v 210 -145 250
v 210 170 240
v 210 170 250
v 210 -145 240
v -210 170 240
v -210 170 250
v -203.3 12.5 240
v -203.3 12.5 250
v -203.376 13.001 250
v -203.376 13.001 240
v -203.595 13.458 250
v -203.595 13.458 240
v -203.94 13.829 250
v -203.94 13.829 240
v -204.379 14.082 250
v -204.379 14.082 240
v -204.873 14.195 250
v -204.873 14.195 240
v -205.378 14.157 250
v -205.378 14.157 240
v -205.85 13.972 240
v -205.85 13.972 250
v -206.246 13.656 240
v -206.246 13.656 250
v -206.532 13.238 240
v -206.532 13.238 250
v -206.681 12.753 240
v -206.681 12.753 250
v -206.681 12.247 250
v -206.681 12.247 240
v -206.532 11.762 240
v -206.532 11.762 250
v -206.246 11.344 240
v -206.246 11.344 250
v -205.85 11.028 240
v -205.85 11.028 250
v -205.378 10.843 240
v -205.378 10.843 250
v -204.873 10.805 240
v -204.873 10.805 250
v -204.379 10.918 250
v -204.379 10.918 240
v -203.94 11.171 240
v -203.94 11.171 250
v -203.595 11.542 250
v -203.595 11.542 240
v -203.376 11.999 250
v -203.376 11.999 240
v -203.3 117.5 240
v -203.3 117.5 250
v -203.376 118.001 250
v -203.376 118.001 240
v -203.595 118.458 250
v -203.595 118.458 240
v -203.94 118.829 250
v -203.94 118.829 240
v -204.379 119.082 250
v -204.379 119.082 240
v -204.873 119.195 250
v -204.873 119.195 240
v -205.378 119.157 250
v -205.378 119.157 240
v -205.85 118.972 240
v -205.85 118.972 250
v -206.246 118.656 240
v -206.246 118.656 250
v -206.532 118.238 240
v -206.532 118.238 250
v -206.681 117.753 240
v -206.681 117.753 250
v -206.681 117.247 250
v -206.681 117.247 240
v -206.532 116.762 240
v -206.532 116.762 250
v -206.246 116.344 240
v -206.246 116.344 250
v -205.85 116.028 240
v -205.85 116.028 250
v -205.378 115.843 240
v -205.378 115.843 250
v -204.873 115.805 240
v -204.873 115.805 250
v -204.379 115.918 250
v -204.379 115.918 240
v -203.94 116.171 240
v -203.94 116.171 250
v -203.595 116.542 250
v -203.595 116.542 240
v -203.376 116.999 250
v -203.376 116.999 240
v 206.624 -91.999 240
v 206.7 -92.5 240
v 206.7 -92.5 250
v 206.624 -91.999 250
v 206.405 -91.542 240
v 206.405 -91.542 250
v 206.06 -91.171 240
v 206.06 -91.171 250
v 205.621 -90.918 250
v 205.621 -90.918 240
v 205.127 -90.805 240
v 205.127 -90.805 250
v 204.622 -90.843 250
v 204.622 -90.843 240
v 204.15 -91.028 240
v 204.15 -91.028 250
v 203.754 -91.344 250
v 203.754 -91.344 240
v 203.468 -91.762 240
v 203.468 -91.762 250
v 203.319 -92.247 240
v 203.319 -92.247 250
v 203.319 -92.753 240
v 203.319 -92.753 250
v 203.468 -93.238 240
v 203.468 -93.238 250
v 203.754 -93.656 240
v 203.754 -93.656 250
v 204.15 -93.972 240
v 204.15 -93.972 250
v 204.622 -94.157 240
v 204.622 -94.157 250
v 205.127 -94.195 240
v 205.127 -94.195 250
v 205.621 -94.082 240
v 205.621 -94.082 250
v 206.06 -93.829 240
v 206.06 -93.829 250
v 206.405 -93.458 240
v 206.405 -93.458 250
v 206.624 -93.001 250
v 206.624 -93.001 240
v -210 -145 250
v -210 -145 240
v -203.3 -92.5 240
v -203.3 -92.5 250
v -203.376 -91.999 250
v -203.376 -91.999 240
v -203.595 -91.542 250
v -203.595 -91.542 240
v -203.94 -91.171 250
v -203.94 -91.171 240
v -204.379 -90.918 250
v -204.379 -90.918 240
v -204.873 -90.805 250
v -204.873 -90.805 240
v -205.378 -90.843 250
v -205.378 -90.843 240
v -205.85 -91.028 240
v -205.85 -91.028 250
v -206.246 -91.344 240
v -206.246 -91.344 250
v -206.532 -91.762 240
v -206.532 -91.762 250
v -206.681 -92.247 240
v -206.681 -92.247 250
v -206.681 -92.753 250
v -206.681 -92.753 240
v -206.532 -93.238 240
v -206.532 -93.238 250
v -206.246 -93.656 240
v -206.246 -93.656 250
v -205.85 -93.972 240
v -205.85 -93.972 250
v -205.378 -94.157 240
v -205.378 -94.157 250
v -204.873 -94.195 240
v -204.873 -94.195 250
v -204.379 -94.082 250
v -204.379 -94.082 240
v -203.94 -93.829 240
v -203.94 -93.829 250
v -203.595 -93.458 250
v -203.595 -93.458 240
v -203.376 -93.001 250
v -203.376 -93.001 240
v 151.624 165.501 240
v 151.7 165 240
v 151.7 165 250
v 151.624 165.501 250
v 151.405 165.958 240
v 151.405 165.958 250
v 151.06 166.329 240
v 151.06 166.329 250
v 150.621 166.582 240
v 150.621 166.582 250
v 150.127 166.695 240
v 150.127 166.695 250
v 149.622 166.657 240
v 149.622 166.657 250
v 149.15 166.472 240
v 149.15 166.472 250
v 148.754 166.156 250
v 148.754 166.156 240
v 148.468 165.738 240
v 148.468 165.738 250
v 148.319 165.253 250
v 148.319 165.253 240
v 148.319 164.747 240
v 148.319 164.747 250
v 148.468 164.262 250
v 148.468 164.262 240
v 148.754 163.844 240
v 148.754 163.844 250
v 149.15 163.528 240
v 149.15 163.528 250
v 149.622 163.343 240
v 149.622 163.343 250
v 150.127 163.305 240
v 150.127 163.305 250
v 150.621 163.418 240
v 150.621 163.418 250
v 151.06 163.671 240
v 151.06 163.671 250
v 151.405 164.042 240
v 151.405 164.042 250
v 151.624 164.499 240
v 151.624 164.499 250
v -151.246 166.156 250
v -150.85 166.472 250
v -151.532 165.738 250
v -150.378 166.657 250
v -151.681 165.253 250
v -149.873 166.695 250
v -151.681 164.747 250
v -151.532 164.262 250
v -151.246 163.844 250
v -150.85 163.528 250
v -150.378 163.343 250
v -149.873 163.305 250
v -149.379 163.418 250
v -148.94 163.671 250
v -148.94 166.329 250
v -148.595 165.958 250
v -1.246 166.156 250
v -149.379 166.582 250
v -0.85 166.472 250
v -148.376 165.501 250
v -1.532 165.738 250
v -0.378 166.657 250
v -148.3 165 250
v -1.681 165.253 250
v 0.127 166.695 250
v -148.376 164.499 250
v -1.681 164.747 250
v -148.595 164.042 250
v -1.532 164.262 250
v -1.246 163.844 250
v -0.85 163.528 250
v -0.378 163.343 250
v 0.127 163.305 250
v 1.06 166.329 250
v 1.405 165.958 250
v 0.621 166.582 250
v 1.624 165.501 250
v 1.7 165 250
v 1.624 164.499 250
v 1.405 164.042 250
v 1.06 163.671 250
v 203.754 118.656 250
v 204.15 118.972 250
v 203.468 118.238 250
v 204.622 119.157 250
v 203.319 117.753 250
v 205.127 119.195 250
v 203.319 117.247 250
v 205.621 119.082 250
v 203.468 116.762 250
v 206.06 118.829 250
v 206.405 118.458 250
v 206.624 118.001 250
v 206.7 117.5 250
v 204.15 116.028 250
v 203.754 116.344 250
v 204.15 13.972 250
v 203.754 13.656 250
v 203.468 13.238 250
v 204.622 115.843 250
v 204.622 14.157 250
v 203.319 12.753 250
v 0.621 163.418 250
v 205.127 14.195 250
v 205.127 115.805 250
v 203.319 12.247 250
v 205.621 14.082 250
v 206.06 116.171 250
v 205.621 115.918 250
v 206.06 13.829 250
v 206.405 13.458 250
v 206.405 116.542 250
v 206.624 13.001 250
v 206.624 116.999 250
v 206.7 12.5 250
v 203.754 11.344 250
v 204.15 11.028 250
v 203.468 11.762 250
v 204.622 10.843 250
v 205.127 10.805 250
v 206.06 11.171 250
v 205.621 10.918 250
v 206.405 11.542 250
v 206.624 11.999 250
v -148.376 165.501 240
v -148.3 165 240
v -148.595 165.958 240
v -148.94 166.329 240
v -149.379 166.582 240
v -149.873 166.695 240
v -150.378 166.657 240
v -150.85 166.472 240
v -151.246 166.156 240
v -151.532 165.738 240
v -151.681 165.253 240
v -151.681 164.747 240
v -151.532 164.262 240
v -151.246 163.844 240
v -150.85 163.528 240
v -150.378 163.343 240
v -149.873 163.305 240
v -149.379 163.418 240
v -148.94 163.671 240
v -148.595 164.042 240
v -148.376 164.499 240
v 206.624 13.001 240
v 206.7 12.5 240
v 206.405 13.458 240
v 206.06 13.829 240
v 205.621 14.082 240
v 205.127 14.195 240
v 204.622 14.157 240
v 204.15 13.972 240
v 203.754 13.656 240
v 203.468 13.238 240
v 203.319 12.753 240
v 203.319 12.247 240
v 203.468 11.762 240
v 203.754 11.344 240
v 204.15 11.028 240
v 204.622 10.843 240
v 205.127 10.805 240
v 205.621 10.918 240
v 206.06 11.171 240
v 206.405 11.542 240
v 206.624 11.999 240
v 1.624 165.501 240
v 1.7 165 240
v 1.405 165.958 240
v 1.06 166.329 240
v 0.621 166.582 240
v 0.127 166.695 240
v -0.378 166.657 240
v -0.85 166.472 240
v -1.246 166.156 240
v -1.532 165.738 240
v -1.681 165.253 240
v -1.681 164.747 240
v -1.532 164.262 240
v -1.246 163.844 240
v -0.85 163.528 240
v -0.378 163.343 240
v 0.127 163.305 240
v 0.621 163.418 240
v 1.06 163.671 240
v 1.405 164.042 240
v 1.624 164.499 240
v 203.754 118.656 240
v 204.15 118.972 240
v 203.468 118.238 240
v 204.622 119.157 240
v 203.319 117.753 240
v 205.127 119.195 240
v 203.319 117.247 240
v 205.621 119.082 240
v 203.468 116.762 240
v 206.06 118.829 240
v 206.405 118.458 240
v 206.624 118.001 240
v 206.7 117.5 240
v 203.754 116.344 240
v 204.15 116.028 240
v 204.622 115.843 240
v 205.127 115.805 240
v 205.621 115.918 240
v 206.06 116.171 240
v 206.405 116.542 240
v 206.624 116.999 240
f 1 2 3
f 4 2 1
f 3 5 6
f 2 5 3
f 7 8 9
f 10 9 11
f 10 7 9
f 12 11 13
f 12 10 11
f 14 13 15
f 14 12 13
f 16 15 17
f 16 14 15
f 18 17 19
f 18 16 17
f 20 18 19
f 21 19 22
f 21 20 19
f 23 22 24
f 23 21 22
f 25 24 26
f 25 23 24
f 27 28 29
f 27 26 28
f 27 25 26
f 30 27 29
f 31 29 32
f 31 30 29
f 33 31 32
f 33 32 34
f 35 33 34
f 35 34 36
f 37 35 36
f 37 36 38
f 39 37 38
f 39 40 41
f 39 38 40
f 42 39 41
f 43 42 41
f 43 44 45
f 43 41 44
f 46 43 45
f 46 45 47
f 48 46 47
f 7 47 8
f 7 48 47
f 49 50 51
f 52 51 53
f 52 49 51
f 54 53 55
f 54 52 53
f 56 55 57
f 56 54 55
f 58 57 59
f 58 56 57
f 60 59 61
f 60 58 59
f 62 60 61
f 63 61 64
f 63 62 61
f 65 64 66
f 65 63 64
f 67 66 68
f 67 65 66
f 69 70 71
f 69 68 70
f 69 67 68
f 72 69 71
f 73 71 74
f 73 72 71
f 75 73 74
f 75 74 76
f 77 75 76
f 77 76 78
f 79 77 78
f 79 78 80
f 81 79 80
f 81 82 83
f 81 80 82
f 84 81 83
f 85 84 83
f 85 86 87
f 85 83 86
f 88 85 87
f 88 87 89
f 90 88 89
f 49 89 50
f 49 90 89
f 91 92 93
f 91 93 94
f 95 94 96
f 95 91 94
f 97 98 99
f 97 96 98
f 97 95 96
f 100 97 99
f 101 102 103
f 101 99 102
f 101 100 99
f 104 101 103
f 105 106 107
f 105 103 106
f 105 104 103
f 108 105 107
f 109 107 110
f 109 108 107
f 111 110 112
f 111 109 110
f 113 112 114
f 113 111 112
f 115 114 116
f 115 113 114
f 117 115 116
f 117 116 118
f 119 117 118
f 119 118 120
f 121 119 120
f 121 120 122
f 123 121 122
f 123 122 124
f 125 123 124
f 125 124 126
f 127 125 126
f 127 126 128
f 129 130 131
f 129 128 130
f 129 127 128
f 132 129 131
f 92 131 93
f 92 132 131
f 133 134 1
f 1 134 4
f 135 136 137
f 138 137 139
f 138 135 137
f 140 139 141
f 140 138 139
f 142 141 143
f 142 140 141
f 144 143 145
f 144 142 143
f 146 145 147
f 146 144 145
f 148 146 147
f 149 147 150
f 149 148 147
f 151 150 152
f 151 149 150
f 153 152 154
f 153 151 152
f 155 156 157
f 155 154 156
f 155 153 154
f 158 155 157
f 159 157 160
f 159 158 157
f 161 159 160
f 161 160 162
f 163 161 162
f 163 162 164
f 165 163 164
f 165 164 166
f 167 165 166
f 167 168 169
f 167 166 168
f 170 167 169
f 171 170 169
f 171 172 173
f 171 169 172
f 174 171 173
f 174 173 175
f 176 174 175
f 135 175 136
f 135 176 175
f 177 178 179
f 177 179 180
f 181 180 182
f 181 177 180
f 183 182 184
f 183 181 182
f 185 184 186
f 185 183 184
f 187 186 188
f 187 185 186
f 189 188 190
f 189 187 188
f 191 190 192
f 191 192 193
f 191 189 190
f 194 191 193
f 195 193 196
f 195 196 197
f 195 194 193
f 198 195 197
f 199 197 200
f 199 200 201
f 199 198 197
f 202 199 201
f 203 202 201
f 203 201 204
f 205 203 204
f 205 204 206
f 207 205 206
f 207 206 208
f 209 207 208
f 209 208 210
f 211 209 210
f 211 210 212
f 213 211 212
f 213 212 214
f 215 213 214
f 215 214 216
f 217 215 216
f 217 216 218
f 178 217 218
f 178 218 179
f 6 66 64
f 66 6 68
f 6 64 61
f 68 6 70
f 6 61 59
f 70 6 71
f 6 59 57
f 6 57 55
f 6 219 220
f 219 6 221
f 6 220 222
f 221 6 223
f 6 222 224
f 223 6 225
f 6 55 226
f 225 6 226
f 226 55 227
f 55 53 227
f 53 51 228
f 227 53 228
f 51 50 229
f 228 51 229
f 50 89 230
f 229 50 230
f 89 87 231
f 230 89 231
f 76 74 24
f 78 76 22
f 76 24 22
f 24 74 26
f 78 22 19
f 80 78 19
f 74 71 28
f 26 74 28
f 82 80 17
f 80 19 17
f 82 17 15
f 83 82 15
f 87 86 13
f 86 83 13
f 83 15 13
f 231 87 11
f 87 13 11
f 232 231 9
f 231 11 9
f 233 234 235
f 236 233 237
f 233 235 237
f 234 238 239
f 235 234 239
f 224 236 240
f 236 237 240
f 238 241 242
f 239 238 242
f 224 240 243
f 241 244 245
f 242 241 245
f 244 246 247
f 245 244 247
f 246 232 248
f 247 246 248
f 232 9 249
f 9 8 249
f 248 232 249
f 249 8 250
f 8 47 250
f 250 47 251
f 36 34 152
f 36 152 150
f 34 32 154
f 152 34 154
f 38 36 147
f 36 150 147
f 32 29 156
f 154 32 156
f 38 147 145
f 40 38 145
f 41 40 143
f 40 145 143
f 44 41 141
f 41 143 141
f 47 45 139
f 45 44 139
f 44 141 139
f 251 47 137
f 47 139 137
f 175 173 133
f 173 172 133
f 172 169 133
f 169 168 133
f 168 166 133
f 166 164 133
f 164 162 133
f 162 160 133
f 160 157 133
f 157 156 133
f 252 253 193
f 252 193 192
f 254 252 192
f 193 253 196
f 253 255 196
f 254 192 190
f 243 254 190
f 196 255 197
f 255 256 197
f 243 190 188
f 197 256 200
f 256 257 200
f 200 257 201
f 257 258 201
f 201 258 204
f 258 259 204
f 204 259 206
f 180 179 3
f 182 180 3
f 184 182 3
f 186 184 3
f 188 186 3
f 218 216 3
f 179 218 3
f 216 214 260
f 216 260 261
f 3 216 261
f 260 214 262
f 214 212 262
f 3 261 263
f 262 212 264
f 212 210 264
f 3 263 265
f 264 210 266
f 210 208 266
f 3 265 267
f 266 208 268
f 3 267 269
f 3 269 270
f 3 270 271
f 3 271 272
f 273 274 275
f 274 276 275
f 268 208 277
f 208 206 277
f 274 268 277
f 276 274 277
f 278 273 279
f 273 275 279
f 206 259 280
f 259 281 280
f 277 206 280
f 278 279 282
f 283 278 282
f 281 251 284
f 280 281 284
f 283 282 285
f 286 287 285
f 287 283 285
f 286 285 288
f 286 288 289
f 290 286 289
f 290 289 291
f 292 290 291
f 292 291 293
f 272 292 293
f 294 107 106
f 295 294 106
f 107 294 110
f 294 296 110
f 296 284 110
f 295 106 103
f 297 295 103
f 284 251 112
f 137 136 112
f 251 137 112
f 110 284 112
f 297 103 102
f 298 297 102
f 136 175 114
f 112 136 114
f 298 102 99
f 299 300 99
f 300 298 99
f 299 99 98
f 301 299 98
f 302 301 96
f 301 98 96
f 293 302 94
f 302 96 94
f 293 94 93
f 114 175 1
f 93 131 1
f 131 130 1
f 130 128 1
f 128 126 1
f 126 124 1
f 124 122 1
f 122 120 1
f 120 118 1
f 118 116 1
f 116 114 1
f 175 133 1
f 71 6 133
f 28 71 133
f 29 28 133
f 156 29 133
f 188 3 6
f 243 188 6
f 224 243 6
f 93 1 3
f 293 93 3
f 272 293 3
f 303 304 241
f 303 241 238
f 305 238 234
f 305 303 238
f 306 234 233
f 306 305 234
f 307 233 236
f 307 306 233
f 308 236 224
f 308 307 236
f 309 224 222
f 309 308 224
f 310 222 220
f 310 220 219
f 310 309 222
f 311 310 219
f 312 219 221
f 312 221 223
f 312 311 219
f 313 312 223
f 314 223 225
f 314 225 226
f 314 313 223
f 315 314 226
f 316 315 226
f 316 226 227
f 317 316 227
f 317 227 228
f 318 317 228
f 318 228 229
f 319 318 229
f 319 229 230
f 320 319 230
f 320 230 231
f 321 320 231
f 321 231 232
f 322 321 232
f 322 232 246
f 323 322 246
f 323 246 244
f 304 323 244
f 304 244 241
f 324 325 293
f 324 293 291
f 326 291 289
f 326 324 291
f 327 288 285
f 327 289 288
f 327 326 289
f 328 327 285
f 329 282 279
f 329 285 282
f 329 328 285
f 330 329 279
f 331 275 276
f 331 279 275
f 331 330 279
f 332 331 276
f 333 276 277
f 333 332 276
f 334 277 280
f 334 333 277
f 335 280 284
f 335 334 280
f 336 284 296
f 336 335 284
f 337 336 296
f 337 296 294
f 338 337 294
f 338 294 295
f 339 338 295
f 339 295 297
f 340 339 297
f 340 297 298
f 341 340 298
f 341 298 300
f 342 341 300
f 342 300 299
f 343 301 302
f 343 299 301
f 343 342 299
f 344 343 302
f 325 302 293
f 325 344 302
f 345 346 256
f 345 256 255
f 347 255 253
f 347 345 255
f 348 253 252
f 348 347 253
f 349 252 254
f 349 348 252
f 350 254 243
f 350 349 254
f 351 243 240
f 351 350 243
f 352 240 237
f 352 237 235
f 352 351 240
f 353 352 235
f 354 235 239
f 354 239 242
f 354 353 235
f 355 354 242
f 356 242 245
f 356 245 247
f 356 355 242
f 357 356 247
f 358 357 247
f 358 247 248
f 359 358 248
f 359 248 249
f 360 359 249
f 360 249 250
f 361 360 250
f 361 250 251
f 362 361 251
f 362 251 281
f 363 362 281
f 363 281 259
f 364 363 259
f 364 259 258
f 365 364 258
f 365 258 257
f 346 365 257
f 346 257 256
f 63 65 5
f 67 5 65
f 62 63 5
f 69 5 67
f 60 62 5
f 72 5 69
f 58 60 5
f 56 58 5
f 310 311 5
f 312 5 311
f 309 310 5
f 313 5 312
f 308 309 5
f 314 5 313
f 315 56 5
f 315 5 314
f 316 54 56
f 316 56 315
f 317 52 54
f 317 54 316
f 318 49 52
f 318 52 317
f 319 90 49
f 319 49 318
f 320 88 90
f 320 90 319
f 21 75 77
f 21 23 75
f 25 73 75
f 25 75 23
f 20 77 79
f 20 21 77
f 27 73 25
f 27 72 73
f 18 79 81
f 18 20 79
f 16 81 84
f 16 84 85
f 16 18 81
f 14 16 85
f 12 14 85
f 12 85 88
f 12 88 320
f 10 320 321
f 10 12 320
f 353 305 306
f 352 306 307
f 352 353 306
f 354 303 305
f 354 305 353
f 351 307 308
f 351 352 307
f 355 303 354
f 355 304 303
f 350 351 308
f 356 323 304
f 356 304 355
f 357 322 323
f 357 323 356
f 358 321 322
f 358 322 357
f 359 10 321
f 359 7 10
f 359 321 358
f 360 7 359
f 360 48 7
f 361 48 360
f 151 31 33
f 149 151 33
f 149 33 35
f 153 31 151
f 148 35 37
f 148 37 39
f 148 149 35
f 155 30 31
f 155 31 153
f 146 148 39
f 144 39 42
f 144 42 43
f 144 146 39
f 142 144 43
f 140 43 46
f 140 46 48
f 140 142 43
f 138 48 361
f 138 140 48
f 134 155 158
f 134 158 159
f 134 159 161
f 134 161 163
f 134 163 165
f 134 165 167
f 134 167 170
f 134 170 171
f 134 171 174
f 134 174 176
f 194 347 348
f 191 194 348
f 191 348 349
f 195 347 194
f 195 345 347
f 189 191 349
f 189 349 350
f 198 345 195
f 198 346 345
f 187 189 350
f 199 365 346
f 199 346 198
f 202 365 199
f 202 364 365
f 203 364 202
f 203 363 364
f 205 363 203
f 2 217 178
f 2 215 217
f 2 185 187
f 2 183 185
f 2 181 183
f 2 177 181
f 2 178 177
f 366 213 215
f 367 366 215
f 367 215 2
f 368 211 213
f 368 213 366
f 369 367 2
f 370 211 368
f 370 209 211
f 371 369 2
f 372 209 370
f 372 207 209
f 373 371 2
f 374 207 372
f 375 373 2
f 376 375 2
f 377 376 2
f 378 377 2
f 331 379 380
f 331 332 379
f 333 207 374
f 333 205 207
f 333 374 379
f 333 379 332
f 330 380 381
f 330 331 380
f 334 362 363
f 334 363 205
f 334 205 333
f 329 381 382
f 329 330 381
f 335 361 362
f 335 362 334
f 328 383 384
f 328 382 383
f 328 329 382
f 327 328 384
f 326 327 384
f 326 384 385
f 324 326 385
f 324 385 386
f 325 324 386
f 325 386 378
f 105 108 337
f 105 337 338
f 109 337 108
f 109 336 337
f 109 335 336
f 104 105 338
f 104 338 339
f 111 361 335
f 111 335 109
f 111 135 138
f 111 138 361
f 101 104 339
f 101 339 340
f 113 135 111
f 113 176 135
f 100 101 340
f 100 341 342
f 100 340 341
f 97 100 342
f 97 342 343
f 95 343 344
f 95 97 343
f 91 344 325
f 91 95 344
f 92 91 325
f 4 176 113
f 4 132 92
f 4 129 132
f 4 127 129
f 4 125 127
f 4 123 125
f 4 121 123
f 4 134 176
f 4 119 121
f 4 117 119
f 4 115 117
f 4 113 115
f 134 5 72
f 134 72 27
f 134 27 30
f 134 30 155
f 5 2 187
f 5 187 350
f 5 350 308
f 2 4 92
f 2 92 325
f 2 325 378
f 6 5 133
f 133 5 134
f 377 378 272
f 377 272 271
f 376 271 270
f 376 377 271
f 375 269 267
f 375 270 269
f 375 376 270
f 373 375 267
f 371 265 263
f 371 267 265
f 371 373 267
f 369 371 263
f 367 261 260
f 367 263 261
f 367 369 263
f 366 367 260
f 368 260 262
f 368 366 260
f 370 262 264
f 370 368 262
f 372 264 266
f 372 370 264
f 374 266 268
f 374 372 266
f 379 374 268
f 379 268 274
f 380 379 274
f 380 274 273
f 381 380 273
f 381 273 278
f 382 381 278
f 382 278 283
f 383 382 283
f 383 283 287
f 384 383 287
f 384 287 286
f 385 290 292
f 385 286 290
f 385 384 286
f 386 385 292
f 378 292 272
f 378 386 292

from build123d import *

# Parameters (mm, degrees)
CYLINDER072_R     = 1.7
CYLINDER072_DEPTH = 20
CYLINDER073_R     = 1.7
CYLINDER073_DEPTH = 20
CYLINDER069_R     = 1.7
CYLINDER069_DEPTH = 20
CYLINDER071_R     = 1.7
CYLINDER071_DEPTH = 20
CYLINDER070_R     = 1.7
CYLINDER070_DEPTH = 20
SKETCH036_R       = 1.7
PAD034_DEPTH      = 20
CYLINDER068_R     = 1.7
CYLINDER068_DEPTH = 20
SKETCH035_W       = 420
SKETCH035_H       = 315
PAD033_DEPTH      = 10


with BuildPart() as cylinder072:
    # Cylinder072 → Cylinder072 (new body)
    with BuildSketch(Plane(origin=(205, 117.5, 235), x_dir=(1, 0, 0), z_dir=(0, 0, 1))):
        Circle(CYLINDER072_R)
    extrude(amount=CYLINDER072_DEPTH)


with BuildPart() as cylinder073:
    # Cylinder073 → Cylinder073 (new body)
    with BuildSketch(Plane(origin=(205, -92.5, 235), x_dir=(1, 0, 0), z_dir=(0, 0, 1))):
        Circle(CYLINDER073_R)
    extrude(amount=CYLINDER073_DEPTH)


with BuildPart() as cylinder069:
    # Cylinder069 → Cylinder069 (new body)
    with BuildSketch(Plane(origin=(-205, 117.5, 240), x_dir=(1, 0, 0), z_dir=(0, 0, 1))):
        Circle(CYLINDER069_R)
    extrude(amount=CYLINDER069_DEPTH)


with BuildPart() as cylinder071:
    # Cylinder071 → Cylinder071 (new body)
    with BuildSketch(Plane(origin=(205, 12.5, 235), x_dir=(1, 0, 0), z_dir=(0, 0, 1))):
        Circle(CYLINDER071_R)
    extrude(amount=CYLINDER071_DEPTH)


with BuildPart() as cylinder070:
    # Cylinder070 → Cylinder070 (new body)
    with BuildSketch(Plane(origin=(-205, 12.5, 240), x_dir=(1, 0, 0), z_dir=(0, 0, 1))):
        Circle(CYLINDER070_R)
    extrude(amount=CYLINDER070_DEPTH)


with BuildPart() as pad034:
    # Sketch036 → Pad034 (new body)
    with BuildSketch(Plane(origin=(0, -75, 230), x_dir=(1, 0, 0), z_dir=(0, 0, 1))):
        with Locations((-150, 240)):
            Circle(SKETCH036_R)
        with Locations((150, 240)):
            Circle(SKETCH036_R)
        with Locations((0, 240)):
            Circle(SKETCH036_R)
    extrude(amount=PAD034_DEPTH)


with BuildPart() as fusion029:
    # Cylinder068 → Cylinder068 (new body)
    with BuildSketch(Plane(origin=(-205, -92.5, 240), x_dir=(1, 0, 0), z_dir=(0, 0, 1))):
        Circle(CYLINDER068_R)
    extrude(amount=CYLINDER068_DEPTH)

    # Fusion029: union Cylinder072, Cylinder073, Cylinder069, Cylinder071, Cylinder070, Pad034
    add(cylinder072.part)
    add(cylinder073.part)
    add(cylinder069.part)
    add(cylinder071.part)
    add(cylinder070.part)
    add(pad034.part)


with BuildPart() as cut023:
    # Sketch035 → Pad033 (new body)
    with BuildSketch(Plane(origin=(0, 0, 240), x_dir=(1, 0, 0), z_dir=(0, 0, -1))):
        with Locations((0, -12.5)):
            Rectangle(SKETCH035_W, SKETCH035_H)
    extrude(amount=-PAD033_DEPTH)

    # Cut023: cut Fusion029
    add(fusion029.part, mode=Mode.SUBTRACT)


solid = cut023.part
